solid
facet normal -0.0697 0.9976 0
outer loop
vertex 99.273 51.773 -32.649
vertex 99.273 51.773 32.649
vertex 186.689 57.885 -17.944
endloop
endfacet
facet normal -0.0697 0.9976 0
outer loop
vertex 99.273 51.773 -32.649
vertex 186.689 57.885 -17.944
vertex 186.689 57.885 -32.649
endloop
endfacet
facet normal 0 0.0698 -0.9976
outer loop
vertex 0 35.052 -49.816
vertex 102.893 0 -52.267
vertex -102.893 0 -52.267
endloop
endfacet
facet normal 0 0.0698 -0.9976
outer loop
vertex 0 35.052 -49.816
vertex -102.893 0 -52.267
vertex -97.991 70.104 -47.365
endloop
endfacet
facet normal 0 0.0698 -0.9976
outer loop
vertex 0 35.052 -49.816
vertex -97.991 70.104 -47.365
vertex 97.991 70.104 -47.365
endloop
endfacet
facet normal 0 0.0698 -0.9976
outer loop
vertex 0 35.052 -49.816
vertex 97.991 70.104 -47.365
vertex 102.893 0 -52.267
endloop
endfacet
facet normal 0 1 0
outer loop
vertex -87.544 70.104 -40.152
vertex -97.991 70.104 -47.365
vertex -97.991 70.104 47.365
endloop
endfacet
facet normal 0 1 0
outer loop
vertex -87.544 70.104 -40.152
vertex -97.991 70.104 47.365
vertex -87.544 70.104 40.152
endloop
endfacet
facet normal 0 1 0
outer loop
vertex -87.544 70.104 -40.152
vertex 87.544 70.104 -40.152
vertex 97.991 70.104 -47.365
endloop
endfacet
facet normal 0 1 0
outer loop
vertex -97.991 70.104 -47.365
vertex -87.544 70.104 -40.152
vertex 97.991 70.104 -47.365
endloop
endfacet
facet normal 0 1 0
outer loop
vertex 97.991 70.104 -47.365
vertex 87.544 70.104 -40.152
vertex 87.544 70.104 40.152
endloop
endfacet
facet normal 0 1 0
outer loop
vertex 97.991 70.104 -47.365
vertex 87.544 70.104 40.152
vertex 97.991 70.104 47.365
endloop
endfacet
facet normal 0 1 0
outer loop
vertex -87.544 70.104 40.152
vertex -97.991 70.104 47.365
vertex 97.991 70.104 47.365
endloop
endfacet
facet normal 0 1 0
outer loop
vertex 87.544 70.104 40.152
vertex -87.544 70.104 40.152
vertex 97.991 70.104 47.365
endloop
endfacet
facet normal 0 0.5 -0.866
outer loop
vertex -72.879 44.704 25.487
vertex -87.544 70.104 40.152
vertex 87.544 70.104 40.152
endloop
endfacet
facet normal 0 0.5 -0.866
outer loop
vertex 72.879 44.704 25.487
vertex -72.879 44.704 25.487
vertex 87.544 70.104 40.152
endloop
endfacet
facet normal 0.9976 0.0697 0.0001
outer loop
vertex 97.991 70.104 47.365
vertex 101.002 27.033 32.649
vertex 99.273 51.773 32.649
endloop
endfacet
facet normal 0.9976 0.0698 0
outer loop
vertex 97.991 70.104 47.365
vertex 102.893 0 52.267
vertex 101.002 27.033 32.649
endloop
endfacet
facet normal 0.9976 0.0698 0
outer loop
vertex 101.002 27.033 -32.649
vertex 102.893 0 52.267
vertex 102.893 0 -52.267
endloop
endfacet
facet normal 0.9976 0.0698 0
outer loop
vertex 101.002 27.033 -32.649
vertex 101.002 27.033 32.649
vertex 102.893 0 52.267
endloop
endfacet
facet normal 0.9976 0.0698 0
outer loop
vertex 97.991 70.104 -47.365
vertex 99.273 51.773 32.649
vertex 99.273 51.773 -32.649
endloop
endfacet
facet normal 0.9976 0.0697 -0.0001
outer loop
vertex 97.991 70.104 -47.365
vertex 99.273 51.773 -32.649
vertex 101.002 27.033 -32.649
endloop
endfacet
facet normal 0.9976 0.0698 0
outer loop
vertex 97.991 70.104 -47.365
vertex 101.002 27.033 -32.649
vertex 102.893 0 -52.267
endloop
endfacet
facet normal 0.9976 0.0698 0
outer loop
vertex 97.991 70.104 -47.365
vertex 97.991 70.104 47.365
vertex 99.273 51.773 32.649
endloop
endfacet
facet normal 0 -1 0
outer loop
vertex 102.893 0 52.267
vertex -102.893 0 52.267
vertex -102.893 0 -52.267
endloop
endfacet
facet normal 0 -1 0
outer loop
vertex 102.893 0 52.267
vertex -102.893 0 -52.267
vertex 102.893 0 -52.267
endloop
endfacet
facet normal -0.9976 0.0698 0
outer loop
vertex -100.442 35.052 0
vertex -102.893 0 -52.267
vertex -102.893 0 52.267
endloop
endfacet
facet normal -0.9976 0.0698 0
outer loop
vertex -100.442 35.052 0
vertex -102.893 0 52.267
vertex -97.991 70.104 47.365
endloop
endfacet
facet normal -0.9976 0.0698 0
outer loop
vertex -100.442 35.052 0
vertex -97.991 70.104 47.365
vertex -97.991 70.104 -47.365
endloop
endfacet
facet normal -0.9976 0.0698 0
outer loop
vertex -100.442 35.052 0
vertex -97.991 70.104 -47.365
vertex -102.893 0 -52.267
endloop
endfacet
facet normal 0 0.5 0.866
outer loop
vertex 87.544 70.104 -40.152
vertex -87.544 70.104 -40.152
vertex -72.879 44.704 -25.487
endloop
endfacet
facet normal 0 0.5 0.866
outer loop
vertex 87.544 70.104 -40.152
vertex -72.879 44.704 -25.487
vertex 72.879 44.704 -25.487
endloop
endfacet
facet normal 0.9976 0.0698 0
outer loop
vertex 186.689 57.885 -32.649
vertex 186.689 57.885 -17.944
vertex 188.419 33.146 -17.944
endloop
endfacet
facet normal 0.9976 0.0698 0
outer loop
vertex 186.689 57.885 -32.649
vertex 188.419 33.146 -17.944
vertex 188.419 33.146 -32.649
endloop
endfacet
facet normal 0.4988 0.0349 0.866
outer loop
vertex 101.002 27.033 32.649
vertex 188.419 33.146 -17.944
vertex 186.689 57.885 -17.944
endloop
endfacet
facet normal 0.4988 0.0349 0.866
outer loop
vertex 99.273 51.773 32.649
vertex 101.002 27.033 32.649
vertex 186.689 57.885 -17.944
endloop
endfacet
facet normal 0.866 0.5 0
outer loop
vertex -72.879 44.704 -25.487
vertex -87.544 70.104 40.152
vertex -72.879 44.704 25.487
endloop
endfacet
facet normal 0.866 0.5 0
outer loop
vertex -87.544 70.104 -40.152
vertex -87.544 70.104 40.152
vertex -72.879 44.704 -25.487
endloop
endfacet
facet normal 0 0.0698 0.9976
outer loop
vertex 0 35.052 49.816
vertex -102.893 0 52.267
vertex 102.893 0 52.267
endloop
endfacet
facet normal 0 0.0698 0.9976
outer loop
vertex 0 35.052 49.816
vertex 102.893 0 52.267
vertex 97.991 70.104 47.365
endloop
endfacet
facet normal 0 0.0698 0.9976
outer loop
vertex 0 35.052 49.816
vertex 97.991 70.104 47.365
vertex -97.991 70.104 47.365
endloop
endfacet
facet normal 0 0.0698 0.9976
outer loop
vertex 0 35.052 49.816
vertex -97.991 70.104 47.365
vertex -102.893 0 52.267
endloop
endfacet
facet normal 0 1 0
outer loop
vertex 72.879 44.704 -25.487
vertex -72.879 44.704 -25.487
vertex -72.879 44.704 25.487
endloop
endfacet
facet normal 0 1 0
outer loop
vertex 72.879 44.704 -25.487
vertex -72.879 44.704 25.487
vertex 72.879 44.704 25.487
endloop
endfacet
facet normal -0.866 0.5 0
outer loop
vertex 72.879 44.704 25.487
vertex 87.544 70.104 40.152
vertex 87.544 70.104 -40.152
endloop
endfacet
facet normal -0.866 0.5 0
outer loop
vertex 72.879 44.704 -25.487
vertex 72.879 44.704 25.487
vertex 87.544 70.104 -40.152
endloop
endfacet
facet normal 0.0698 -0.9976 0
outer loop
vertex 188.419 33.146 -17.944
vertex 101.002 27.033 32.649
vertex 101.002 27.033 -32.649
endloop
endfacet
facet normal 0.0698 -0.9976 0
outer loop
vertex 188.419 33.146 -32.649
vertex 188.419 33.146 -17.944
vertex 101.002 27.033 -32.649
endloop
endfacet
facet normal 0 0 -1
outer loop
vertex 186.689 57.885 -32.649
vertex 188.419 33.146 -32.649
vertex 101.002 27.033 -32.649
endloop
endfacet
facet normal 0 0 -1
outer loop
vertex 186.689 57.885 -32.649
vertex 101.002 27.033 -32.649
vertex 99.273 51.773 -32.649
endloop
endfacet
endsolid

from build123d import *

# Parameters (mm, degrees)
SKETCH1_W           = 205.785682804
SKETCH1_H           = 104.534748446
BOSS_EXTRUDE1_DEPTH = 70.104
BOSS_EXTRUDE1_TAPER = 4
SKETCH2_W           = 145.758865666
SKETCH2_H           = 50.974097726
CUT_EXTRUDE1_DEPTH  = 25.4
SKETCH3_W           = 65.29816474
SKETCH3_H           = 24.799651417
BOSS_EXTRUDE2_DEPTH = 87.63
DRAFT1_ANGLE        = 30
DRAFT2_ANGLE        = 30


with BuildPart() as part:
    # Sketch1 → Boss-Extrude1 (new body)
    with BuildSketch(Plane(origin=(0, 0, 0), x_dir=(1, 0, 0), z_dir=(0, 1, 0))):
        Rectangle(SKETCH1_W, SKETCH1_H)
    extrude(amount=BOSS_EXTRUDE1_DEPTH, taper=BOSS_EXTRUDE1_TAPER)

    # Sketch2 → Cut-Extrude1 (cut)
    with BuildSketch(Plane(origin=(0, 70.104, 0), x_dir=(1, 0, 0), z_dir=(0, 1, 0))):
        Rectangle(SKETCH2_W, SKETCH2_H)
    extrude(amount=-CUT_EXTRUDE1_DEPTH, mode=Mode.SUBTRACT)

    # Sketch3 → Boss-Extrude2 (add)
    with BuildSketch(Plane(origin=(102.392168372, 7.159957902, 0), x_dir=(0, 0, -1), z_dir=(0.9975640502598242, 0.06975647374412534, 0))):
        with Locations((0, 32.321763147)):
            Rectangle(SKETCH3_W, SKETCH3_H)
    extrude(amount=BOSS_EXTRUDE2_DEPTH)

    # Draft1
    draft1_faces = [part.faces().sort_by_distance(p)[0] for p in [
        (0, 57.404, 25.487048863),
        (72.879432833, 57.404, 0),
        (0, 57.404, -25.487048863),
        (-72.879432833, 57.404, 0),
    ]]
    draft(draft1_faces, Plane.ZX.offset(44.704), DRAFT1_ANGLE)

    # Draft2
    draft2_faces = [part.faces().sort_by_distance(p)[0] for p in [
        (143.845785012, 42.459366756, 32.64908237),
    ]]
    draft(draft2_faces, Plane(origin=(102.892841402, 0, 52.267374223), x_dir=(-0.06975647374412534, 0.9975640502598243, 0), z_dir=(0.9975640502598243, 0.06975647374412534, 0)), DRAFT2_ANGLE)


solid = part.part
